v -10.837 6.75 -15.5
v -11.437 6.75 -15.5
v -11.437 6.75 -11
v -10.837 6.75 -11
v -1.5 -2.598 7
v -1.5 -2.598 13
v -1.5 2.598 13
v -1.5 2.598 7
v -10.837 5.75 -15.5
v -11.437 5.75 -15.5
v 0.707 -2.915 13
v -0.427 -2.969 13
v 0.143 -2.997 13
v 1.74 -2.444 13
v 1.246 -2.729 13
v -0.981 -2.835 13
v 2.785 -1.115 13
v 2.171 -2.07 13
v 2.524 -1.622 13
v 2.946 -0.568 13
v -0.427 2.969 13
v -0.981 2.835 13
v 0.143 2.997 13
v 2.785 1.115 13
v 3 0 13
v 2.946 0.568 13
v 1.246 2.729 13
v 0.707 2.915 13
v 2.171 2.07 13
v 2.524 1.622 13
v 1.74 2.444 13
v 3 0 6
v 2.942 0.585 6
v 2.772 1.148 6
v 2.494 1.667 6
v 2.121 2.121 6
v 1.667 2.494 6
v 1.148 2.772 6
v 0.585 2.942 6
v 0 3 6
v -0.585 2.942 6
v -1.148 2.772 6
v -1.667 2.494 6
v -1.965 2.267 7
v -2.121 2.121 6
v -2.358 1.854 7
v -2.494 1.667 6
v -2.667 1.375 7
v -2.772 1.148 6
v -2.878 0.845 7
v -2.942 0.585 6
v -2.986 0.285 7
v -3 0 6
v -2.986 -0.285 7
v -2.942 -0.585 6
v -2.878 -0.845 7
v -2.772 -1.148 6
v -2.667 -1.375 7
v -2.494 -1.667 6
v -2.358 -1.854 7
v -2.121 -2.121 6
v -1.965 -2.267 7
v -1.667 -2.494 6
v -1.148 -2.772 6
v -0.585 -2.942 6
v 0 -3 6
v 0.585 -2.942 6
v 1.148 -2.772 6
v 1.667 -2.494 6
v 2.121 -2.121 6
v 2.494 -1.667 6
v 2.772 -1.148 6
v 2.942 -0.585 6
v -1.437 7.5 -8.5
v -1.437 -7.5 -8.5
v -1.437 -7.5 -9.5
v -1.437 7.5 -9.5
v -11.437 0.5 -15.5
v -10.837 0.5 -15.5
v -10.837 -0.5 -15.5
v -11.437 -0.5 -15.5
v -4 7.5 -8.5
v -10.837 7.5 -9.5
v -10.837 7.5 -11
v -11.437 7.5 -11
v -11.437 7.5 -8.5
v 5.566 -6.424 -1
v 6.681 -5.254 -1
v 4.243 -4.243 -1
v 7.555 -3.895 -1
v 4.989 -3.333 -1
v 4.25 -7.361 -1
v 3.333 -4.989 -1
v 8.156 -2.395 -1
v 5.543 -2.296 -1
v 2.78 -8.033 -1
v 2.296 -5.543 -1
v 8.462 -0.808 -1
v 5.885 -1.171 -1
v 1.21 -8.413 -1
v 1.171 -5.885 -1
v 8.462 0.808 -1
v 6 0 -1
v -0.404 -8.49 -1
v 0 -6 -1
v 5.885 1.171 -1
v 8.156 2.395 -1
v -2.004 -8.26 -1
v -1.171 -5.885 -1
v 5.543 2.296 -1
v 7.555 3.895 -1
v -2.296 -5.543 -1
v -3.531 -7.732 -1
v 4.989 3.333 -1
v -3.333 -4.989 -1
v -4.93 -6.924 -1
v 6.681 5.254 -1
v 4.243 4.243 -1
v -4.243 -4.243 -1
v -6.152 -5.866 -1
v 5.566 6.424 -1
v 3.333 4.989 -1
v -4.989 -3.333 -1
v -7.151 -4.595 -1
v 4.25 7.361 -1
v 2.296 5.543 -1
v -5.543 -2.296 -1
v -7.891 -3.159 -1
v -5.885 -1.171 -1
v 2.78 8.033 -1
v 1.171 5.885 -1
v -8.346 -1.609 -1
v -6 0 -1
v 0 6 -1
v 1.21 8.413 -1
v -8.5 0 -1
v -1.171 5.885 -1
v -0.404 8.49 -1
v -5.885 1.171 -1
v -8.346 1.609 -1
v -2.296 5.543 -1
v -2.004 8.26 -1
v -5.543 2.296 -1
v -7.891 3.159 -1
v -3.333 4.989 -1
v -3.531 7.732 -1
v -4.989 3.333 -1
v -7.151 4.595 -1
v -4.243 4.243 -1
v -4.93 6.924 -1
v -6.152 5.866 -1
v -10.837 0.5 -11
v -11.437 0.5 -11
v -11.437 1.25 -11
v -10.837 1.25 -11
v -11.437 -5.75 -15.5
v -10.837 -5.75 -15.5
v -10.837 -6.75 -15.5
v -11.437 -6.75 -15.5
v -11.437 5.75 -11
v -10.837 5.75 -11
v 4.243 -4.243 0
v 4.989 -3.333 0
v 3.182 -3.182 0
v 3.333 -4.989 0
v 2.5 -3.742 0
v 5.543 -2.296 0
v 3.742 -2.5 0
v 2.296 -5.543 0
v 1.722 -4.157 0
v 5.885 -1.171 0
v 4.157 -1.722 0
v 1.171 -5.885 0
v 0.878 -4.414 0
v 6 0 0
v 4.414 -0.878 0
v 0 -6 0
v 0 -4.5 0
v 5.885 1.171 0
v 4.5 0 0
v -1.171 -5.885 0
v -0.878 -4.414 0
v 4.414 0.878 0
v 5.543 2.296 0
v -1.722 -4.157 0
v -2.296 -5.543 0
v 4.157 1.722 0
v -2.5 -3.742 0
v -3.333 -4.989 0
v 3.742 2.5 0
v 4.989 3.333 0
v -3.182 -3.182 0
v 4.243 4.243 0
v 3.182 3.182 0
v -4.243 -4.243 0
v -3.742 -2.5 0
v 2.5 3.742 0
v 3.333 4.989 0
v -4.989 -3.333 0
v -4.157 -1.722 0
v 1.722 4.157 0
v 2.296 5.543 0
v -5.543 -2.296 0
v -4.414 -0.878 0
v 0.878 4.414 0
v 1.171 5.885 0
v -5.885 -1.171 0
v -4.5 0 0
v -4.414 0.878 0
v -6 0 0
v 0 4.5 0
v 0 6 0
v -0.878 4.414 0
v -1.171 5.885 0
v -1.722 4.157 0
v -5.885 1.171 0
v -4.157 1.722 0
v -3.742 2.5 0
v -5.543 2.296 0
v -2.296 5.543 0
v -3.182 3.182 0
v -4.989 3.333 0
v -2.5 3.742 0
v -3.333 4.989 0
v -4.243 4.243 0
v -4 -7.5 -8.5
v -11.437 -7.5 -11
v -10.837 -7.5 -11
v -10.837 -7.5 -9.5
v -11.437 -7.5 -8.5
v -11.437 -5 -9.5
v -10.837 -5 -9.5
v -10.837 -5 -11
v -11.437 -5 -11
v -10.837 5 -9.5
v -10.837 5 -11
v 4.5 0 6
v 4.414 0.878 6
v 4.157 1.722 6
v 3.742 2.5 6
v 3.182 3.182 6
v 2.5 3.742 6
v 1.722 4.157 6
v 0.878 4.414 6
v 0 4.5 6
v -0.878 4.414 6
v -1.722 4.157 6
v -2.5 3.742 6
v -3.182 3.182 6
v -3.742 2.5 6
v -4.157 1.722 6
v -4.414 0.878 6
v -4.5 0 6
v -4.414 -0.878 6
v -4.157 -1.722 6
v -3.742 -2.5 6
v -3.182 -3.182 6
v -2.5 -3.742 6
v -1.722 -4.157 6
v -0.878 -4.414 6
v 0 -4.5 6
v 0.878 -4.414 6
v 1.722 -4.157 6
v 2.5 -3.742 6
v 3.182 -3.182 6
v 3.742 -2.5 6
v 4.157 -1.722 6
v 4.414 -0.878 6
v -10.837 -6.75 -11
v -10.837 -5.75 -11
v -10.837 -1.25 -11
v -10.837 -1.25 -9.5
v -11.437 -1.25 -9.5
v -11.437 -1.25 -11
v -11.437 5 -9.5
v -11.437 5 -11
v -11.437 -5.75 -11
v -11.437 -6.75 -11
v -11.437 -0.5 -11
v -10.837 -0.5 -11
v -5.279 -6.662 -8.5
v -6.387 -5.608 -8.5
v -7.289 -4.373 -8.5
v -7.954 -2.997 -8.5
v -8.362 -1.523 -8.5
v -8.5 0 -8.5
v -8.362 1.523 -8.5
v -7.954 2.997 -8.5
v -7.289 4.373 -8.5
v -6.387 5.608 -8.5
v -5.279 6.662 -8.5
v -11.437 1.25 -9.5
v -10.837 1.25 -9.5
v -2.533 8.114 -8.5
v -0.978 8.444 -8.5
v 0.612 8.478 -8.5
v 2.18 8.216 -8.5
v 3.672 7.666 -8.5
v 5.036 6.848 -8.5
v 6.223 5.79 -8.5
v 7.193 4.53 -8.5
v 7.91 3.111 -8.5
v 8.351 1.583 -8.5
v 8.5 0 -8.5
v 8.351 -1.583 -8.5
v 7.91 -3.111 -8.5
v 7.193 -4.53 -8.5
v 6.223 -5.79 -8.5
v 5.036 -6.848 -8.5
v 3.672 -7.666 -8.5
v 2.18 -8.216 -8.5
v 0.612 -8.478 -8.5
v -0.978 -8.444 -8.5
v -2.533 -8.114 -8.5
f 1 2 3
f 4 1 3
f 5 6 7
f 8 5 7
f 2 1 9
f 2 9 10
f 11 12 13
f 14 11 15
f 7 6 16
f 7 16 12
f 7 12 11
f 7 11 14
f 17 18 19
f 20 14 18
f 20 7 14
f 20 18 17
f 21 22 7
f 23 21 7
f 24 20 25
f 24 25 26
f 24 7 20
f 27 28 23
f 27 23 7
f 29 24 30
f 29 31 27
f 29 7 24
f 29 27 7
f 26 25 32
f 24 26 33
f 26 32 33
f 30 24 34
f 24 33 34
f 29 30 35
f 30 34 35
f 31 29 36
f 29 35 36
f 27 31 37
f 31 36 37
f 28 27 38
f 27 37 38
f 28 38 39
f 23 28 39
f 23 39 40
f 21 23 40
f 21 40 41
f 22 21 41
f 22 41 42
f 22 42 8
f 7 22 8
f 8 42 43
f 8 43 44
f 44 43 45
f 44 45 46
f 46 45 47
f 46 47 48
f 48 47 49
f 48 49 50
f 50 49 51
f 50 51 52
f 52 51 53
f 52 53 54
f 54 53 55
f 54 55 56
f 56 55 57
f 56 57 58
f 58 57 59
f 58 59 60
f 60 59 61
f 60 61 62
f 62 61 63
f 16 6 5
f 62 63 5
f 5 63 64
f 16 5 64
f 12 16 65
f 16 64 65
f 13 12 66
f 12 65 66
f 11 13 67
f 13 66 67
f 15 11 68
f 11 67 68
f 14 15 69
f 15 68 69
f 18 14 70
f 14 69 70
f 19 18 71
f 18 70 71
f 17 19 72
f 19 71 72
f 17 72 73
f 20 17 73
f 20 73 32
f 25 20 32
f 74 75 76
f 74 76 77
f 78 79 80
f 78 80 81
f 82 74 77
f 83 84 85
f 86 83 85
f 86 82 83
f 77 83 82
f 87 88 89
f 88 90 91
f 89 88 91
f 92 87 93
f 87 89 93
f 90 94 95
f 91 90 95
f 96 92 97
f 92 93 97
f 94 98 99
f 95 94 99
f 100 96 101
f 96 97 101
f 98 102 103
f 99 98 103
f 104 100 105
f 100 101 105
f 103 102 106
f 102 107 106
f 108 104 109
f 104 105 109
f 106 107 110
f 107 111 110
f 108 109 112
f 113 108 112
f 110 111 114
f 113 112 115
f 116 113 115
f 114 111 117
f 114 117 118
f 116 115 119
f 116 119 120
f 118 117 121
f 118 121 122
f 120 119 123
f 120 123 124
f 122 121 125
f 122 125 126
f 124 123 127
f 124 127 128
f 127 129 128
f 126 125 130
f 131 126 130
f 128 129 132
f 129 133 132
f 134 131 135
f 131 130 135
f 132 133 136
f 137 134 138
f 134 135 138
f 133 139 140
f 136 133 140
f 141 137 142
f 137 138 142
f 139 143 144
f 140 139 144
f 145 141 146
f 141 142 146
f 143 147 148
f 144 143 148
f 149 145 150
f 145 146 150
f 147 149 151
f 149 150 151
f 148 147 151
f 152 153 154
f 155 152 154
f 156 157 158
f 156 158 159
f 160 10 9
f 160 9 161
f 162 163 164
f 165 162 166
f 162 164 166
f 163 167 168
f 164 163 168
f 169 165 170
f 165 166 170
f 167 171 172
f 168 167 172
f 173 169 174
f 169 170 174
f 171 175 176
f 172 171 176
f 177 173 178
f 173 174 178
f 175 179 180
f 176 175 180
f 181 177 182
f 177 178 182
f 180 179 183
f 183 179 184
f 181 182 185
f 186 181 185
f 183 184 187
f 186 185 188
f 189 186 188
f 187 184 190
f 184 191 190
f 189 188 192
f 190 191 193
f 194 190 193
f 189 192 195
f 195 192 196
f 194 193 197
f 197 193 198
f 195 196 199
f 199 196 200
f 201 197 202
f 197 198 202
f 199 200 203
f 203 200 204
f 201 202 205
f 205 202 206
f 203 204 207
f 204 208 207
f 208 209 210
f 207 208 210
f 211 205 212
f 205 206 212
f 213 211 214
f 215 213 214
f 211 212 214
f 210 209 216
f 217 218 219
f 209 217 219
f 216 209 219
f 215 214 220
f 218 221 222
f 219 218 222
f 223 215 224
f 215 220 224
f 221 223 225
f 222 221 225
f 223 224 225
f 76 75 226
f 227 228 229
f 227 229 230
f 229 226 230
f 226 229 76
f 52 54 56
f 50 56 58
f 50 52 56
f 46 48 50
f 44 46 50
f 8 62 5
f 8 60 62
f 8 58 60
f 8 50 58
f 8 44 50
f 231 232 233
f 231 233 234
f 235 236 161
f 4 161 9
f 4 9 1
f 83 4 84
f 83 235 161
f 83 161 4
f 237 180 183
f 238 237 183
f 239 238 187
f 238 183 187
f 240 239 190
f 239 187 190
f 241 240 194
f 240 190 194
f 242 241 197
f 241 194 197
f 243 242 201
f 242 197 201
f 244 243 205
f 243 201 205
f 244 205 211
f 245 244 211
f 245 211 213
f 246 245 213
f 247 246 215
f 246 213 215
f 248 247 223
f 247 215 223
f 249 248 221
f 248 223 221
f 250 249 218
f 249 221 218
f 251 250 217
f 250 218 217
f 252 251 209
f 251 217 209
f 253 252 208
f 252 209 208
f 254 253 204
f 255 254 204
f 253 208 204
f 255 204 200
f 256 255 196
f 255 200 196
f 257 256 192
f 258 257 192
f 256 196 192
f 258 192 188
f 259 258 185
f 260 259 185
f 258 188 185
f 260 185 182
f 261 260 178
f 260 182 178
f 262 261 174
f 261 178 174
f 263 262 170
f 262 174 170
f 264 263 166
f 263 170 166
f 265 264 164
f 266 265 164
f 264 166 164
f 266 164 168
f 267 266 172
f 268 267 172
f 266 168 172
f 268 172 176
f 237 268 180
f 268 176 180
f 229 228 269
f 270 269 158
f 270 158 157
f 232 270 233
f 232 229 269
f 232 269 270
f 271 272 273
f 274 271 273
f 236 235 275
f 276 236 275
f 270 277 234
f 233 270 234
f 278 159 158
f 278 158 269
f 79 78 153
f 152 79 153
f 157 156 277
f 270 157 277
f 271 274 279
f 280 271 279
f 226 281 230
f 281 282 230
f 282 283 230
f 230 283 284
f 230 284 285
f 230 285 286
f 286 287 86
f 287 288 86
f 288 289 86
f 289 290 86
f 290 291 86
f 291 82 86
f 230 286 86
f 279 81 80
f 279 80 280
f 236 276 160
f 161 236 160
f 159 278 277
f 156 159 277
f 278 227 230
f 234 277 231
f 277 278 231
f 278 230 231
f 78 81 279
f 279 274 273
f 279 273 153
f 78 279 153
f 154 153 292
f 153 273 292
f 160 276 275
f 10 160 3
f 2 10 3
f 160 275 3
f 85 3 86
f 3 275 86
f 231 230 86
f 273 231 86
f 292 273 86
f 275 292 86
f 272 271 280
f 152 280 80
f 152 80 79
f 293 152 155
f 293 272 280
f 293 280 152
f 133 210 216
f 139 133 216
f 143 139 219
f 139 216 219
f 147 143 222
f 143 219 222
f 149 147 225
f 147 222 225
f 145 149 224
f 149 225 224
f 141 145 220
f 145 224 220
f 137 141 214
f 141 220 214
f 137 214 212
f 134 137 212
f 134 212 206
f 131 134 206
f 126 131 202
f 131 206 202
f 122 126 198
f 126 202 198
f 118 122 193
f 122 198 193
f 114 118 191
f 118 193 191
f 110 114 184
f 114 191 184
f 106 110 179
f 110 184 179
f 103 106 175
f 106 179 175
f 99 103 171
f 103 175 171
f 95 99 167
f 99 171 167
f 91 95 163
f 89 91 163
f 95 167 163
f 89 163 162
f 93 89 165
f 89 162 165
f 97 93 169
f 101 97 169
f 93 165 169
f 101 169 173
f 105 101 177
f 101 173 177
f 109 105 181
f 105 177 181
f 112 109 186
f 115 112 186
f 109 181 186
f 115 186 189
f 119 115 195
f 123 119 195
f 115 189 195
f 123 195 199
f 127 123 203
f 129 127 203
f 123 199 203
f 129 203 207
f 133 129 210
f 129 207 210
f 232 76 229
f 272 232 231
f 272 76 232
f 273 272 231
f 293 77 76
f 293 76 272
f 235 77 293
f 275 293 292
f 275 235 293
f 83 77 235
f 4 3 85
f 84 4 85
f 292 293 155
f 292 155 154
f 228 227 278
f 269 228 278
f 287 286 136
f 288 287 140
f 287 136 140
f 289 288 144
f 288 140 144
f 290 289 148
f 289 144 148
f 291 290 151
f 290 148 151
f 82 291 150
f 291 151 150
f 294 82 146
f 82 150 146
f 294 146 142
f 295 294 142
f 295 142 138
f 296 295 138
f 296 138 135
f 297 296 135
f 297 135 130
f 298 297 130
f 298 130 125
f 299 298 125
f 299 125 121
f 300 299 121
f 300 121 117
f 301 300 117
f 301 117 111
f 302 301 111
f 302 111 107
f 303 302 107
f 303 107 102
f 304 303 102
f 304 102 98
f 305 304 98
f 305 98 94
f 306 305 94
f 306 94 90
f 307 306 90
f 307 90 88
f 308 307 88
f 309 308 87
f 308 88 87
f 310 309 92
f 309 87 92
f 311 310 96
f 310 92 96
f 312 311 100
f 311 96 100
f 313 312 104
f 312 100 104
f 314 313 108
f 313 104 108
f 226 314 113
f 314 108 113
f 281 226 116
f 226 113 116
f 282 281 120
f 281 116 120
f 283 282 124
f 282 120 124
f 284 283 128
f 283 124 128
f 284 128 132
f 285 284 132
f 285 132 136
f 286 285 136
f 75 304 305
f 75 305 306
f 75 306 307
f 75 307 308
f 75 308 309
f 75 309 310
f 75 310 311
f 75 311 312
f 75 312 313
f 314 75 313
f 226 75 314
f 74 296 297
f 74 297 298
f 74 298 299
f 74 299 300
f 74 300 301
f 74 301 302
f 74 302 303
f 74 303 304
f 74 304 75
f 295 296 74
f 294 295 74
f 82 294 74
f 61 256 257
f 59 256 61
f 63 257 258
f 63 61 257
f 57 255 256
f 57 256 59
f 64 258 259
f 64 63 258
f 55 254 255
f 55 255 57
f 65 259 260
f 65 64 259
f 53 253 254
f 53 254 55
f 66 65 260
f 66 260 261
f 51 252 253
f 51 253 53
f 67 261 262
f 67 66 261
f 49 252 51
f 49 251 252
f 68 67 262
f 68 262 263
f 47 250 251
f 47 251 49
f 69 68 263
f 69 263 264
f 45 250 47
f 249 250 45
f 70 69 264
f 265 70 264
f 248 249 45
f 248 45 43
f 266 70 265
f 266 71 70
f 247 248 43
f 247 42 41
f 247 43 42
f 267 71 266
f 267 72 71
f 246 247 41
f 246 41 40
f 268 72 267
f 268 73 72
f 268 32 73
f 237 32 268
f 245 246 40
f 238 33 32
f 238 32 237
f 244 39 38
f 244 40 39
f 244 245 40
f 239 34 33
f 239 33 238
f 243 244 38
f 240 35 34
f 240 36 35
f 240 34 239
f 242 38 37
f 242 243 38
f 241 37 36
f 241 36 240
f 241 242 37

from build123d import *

# Parameters (mm, degrees)
SKETCH_1_R          = 4.5
EXTRUDE_1_DEPTH     = 6
SKETCH_2_R          = 3
EXTRUDE_2_DEPTH     = 7
SKETCH_3_W          = 3.768316072
SKETCH_3_H          = 6.517836593
CUT_EXTRUDE_1_DEPTH = 6
SKETCH_4_R          = 6
EXTRUDE_3_DEPTH     = 1
SKETCH_5_R          = 8.5
EXTRUDE_4_DEPTH     = 7.5
SKETCH_6_W          = 10
SKETCH_6_H          = 15
EXTRUDE_5_DEPTH     = 1
SKETCH_7_W          = 0.6
SKETCH_7_H          = 2.5
EXTRUDE_6_DEPTH     = 6
SKETCH_8_W          = 4.5
SKETCH_8_H          = 0.75
CUT_EXTRUDE_2_DEPTH = 27.645896495


with BuildPart() as part:
    # Эскиз1 → Бобышка-Вытянуть1 (new body)
    with BuildSketch(Plane.XY):
        Circle(SKETCH_1_R)
    extrude(amount=EXTRUDE_1_DEPTH)

    # Эскиз2 → Бобышка-Вытянуть2 (add)
    with BuildSketch(Plane.XY.offset(6)):
        Circle(SKETCH_2_R)
    extrude(amount=EXTRUDE_2_DEPTH)

    # Эскиз3 → Вырез-Вытянуть1 (cut)
    with BuildSketch(Plane.XY.offset(13)):
        with Locations((-3.384158036, 0.355964711)):
            Rectangle(SKETCH_3_W, SKETCH_3_H)
    extrude(amount=-CUT_EXTRUDE_1_DEPTH, mode=Mode.SUBTRACT)

    # Эскиз4 → Бобышка-Вытянуть3 (add)
    with BuildSketch(Plane(origin=(0, 0, 0), x_dir=(-1, 0, 0), z_dir=(0, 0, -1))):
        Circle(SKETCH_4_R)
    extrude(amount=EXTRUDE_3_DEPTH)

    # Эскиз5 → Бобышка-Вытянуть4 (add)
    with BuildSketch(Plane(origin=(0, 0, -1), x_dir=(-1, 0, 0), z_dir=(0, 0, -1))):
        Circle(SKETCH_5_R)
    extrude(amount=EXTRUDE_4_DEPTH)

    # Эскиз6 → Бобышка-Вытянуть5 (add)
    with BuildSketch(Plane(origin=(0, 0, -8.5), x_dir=(-1, 0, 0), z_dir=(0, 0, -1))):
        with Locations((6.437497336, 0)):
            Rectangle(SKETCH_6_W, SKETCH_6_H)
    extrude(amount=EXTRUDE_5_DEPTH)

    # Эскиз7 → Бобышка-Вытянуть6 (add)
    with BuildSketch(Plane(origin=(0, 0, -9.5), x_dir=(-1, 0, 0), z_dir=(0, 0, -1))):
        with Locations((11.137497336, 6.25)):
            Rectangle(SKETCH_7_W, SKETCH_7_H)
        with Locations((11.137497336, 0)):
            Rectangle(SKETCH_7_W, SKETCH_7_H)
        with Locations((11.137497336, -6.25)):
            Rectangle(SKETCH_7_W, SKETCH_7_H)
    extrude(amount=EXTRUDE_6_DEPTH)

    # Эскиз8 → Вырез-Вытянуть2 (cut, through all)
    with BuildSketch(Plane.ZY.offset(11.437497336)):
        with Locations((-13.25, 7.125)):
            Rectangle(SKETCH_8_W, SKETCH_8_H)
        with Locations((-13.25, 5.375)):
            Rectangle(SKETCH_8_W, SKETCH_8_H)
        with Locations((-13.25, 0.875)):
            Rectangle(SKETCH_8_W, SKETCH_8_H)
        with Locations((-13.25, -0.875)):
            Rectangle(SKETCH_8_W, SKETCH_8_H)
        with Locations((-13.25, -5.375)):
            Rectangle(SKETCH_8_W, SKETCH_8_H)
        with Locations((-13.25, -7.125)):
            Rectangle(SKETCH_8_W, SKETCH_8_H)
    extrude(amount=-CUT_EXTRUDE_2_DEPTH, mode=Mode.SUBTRACT)


solid = part.part
